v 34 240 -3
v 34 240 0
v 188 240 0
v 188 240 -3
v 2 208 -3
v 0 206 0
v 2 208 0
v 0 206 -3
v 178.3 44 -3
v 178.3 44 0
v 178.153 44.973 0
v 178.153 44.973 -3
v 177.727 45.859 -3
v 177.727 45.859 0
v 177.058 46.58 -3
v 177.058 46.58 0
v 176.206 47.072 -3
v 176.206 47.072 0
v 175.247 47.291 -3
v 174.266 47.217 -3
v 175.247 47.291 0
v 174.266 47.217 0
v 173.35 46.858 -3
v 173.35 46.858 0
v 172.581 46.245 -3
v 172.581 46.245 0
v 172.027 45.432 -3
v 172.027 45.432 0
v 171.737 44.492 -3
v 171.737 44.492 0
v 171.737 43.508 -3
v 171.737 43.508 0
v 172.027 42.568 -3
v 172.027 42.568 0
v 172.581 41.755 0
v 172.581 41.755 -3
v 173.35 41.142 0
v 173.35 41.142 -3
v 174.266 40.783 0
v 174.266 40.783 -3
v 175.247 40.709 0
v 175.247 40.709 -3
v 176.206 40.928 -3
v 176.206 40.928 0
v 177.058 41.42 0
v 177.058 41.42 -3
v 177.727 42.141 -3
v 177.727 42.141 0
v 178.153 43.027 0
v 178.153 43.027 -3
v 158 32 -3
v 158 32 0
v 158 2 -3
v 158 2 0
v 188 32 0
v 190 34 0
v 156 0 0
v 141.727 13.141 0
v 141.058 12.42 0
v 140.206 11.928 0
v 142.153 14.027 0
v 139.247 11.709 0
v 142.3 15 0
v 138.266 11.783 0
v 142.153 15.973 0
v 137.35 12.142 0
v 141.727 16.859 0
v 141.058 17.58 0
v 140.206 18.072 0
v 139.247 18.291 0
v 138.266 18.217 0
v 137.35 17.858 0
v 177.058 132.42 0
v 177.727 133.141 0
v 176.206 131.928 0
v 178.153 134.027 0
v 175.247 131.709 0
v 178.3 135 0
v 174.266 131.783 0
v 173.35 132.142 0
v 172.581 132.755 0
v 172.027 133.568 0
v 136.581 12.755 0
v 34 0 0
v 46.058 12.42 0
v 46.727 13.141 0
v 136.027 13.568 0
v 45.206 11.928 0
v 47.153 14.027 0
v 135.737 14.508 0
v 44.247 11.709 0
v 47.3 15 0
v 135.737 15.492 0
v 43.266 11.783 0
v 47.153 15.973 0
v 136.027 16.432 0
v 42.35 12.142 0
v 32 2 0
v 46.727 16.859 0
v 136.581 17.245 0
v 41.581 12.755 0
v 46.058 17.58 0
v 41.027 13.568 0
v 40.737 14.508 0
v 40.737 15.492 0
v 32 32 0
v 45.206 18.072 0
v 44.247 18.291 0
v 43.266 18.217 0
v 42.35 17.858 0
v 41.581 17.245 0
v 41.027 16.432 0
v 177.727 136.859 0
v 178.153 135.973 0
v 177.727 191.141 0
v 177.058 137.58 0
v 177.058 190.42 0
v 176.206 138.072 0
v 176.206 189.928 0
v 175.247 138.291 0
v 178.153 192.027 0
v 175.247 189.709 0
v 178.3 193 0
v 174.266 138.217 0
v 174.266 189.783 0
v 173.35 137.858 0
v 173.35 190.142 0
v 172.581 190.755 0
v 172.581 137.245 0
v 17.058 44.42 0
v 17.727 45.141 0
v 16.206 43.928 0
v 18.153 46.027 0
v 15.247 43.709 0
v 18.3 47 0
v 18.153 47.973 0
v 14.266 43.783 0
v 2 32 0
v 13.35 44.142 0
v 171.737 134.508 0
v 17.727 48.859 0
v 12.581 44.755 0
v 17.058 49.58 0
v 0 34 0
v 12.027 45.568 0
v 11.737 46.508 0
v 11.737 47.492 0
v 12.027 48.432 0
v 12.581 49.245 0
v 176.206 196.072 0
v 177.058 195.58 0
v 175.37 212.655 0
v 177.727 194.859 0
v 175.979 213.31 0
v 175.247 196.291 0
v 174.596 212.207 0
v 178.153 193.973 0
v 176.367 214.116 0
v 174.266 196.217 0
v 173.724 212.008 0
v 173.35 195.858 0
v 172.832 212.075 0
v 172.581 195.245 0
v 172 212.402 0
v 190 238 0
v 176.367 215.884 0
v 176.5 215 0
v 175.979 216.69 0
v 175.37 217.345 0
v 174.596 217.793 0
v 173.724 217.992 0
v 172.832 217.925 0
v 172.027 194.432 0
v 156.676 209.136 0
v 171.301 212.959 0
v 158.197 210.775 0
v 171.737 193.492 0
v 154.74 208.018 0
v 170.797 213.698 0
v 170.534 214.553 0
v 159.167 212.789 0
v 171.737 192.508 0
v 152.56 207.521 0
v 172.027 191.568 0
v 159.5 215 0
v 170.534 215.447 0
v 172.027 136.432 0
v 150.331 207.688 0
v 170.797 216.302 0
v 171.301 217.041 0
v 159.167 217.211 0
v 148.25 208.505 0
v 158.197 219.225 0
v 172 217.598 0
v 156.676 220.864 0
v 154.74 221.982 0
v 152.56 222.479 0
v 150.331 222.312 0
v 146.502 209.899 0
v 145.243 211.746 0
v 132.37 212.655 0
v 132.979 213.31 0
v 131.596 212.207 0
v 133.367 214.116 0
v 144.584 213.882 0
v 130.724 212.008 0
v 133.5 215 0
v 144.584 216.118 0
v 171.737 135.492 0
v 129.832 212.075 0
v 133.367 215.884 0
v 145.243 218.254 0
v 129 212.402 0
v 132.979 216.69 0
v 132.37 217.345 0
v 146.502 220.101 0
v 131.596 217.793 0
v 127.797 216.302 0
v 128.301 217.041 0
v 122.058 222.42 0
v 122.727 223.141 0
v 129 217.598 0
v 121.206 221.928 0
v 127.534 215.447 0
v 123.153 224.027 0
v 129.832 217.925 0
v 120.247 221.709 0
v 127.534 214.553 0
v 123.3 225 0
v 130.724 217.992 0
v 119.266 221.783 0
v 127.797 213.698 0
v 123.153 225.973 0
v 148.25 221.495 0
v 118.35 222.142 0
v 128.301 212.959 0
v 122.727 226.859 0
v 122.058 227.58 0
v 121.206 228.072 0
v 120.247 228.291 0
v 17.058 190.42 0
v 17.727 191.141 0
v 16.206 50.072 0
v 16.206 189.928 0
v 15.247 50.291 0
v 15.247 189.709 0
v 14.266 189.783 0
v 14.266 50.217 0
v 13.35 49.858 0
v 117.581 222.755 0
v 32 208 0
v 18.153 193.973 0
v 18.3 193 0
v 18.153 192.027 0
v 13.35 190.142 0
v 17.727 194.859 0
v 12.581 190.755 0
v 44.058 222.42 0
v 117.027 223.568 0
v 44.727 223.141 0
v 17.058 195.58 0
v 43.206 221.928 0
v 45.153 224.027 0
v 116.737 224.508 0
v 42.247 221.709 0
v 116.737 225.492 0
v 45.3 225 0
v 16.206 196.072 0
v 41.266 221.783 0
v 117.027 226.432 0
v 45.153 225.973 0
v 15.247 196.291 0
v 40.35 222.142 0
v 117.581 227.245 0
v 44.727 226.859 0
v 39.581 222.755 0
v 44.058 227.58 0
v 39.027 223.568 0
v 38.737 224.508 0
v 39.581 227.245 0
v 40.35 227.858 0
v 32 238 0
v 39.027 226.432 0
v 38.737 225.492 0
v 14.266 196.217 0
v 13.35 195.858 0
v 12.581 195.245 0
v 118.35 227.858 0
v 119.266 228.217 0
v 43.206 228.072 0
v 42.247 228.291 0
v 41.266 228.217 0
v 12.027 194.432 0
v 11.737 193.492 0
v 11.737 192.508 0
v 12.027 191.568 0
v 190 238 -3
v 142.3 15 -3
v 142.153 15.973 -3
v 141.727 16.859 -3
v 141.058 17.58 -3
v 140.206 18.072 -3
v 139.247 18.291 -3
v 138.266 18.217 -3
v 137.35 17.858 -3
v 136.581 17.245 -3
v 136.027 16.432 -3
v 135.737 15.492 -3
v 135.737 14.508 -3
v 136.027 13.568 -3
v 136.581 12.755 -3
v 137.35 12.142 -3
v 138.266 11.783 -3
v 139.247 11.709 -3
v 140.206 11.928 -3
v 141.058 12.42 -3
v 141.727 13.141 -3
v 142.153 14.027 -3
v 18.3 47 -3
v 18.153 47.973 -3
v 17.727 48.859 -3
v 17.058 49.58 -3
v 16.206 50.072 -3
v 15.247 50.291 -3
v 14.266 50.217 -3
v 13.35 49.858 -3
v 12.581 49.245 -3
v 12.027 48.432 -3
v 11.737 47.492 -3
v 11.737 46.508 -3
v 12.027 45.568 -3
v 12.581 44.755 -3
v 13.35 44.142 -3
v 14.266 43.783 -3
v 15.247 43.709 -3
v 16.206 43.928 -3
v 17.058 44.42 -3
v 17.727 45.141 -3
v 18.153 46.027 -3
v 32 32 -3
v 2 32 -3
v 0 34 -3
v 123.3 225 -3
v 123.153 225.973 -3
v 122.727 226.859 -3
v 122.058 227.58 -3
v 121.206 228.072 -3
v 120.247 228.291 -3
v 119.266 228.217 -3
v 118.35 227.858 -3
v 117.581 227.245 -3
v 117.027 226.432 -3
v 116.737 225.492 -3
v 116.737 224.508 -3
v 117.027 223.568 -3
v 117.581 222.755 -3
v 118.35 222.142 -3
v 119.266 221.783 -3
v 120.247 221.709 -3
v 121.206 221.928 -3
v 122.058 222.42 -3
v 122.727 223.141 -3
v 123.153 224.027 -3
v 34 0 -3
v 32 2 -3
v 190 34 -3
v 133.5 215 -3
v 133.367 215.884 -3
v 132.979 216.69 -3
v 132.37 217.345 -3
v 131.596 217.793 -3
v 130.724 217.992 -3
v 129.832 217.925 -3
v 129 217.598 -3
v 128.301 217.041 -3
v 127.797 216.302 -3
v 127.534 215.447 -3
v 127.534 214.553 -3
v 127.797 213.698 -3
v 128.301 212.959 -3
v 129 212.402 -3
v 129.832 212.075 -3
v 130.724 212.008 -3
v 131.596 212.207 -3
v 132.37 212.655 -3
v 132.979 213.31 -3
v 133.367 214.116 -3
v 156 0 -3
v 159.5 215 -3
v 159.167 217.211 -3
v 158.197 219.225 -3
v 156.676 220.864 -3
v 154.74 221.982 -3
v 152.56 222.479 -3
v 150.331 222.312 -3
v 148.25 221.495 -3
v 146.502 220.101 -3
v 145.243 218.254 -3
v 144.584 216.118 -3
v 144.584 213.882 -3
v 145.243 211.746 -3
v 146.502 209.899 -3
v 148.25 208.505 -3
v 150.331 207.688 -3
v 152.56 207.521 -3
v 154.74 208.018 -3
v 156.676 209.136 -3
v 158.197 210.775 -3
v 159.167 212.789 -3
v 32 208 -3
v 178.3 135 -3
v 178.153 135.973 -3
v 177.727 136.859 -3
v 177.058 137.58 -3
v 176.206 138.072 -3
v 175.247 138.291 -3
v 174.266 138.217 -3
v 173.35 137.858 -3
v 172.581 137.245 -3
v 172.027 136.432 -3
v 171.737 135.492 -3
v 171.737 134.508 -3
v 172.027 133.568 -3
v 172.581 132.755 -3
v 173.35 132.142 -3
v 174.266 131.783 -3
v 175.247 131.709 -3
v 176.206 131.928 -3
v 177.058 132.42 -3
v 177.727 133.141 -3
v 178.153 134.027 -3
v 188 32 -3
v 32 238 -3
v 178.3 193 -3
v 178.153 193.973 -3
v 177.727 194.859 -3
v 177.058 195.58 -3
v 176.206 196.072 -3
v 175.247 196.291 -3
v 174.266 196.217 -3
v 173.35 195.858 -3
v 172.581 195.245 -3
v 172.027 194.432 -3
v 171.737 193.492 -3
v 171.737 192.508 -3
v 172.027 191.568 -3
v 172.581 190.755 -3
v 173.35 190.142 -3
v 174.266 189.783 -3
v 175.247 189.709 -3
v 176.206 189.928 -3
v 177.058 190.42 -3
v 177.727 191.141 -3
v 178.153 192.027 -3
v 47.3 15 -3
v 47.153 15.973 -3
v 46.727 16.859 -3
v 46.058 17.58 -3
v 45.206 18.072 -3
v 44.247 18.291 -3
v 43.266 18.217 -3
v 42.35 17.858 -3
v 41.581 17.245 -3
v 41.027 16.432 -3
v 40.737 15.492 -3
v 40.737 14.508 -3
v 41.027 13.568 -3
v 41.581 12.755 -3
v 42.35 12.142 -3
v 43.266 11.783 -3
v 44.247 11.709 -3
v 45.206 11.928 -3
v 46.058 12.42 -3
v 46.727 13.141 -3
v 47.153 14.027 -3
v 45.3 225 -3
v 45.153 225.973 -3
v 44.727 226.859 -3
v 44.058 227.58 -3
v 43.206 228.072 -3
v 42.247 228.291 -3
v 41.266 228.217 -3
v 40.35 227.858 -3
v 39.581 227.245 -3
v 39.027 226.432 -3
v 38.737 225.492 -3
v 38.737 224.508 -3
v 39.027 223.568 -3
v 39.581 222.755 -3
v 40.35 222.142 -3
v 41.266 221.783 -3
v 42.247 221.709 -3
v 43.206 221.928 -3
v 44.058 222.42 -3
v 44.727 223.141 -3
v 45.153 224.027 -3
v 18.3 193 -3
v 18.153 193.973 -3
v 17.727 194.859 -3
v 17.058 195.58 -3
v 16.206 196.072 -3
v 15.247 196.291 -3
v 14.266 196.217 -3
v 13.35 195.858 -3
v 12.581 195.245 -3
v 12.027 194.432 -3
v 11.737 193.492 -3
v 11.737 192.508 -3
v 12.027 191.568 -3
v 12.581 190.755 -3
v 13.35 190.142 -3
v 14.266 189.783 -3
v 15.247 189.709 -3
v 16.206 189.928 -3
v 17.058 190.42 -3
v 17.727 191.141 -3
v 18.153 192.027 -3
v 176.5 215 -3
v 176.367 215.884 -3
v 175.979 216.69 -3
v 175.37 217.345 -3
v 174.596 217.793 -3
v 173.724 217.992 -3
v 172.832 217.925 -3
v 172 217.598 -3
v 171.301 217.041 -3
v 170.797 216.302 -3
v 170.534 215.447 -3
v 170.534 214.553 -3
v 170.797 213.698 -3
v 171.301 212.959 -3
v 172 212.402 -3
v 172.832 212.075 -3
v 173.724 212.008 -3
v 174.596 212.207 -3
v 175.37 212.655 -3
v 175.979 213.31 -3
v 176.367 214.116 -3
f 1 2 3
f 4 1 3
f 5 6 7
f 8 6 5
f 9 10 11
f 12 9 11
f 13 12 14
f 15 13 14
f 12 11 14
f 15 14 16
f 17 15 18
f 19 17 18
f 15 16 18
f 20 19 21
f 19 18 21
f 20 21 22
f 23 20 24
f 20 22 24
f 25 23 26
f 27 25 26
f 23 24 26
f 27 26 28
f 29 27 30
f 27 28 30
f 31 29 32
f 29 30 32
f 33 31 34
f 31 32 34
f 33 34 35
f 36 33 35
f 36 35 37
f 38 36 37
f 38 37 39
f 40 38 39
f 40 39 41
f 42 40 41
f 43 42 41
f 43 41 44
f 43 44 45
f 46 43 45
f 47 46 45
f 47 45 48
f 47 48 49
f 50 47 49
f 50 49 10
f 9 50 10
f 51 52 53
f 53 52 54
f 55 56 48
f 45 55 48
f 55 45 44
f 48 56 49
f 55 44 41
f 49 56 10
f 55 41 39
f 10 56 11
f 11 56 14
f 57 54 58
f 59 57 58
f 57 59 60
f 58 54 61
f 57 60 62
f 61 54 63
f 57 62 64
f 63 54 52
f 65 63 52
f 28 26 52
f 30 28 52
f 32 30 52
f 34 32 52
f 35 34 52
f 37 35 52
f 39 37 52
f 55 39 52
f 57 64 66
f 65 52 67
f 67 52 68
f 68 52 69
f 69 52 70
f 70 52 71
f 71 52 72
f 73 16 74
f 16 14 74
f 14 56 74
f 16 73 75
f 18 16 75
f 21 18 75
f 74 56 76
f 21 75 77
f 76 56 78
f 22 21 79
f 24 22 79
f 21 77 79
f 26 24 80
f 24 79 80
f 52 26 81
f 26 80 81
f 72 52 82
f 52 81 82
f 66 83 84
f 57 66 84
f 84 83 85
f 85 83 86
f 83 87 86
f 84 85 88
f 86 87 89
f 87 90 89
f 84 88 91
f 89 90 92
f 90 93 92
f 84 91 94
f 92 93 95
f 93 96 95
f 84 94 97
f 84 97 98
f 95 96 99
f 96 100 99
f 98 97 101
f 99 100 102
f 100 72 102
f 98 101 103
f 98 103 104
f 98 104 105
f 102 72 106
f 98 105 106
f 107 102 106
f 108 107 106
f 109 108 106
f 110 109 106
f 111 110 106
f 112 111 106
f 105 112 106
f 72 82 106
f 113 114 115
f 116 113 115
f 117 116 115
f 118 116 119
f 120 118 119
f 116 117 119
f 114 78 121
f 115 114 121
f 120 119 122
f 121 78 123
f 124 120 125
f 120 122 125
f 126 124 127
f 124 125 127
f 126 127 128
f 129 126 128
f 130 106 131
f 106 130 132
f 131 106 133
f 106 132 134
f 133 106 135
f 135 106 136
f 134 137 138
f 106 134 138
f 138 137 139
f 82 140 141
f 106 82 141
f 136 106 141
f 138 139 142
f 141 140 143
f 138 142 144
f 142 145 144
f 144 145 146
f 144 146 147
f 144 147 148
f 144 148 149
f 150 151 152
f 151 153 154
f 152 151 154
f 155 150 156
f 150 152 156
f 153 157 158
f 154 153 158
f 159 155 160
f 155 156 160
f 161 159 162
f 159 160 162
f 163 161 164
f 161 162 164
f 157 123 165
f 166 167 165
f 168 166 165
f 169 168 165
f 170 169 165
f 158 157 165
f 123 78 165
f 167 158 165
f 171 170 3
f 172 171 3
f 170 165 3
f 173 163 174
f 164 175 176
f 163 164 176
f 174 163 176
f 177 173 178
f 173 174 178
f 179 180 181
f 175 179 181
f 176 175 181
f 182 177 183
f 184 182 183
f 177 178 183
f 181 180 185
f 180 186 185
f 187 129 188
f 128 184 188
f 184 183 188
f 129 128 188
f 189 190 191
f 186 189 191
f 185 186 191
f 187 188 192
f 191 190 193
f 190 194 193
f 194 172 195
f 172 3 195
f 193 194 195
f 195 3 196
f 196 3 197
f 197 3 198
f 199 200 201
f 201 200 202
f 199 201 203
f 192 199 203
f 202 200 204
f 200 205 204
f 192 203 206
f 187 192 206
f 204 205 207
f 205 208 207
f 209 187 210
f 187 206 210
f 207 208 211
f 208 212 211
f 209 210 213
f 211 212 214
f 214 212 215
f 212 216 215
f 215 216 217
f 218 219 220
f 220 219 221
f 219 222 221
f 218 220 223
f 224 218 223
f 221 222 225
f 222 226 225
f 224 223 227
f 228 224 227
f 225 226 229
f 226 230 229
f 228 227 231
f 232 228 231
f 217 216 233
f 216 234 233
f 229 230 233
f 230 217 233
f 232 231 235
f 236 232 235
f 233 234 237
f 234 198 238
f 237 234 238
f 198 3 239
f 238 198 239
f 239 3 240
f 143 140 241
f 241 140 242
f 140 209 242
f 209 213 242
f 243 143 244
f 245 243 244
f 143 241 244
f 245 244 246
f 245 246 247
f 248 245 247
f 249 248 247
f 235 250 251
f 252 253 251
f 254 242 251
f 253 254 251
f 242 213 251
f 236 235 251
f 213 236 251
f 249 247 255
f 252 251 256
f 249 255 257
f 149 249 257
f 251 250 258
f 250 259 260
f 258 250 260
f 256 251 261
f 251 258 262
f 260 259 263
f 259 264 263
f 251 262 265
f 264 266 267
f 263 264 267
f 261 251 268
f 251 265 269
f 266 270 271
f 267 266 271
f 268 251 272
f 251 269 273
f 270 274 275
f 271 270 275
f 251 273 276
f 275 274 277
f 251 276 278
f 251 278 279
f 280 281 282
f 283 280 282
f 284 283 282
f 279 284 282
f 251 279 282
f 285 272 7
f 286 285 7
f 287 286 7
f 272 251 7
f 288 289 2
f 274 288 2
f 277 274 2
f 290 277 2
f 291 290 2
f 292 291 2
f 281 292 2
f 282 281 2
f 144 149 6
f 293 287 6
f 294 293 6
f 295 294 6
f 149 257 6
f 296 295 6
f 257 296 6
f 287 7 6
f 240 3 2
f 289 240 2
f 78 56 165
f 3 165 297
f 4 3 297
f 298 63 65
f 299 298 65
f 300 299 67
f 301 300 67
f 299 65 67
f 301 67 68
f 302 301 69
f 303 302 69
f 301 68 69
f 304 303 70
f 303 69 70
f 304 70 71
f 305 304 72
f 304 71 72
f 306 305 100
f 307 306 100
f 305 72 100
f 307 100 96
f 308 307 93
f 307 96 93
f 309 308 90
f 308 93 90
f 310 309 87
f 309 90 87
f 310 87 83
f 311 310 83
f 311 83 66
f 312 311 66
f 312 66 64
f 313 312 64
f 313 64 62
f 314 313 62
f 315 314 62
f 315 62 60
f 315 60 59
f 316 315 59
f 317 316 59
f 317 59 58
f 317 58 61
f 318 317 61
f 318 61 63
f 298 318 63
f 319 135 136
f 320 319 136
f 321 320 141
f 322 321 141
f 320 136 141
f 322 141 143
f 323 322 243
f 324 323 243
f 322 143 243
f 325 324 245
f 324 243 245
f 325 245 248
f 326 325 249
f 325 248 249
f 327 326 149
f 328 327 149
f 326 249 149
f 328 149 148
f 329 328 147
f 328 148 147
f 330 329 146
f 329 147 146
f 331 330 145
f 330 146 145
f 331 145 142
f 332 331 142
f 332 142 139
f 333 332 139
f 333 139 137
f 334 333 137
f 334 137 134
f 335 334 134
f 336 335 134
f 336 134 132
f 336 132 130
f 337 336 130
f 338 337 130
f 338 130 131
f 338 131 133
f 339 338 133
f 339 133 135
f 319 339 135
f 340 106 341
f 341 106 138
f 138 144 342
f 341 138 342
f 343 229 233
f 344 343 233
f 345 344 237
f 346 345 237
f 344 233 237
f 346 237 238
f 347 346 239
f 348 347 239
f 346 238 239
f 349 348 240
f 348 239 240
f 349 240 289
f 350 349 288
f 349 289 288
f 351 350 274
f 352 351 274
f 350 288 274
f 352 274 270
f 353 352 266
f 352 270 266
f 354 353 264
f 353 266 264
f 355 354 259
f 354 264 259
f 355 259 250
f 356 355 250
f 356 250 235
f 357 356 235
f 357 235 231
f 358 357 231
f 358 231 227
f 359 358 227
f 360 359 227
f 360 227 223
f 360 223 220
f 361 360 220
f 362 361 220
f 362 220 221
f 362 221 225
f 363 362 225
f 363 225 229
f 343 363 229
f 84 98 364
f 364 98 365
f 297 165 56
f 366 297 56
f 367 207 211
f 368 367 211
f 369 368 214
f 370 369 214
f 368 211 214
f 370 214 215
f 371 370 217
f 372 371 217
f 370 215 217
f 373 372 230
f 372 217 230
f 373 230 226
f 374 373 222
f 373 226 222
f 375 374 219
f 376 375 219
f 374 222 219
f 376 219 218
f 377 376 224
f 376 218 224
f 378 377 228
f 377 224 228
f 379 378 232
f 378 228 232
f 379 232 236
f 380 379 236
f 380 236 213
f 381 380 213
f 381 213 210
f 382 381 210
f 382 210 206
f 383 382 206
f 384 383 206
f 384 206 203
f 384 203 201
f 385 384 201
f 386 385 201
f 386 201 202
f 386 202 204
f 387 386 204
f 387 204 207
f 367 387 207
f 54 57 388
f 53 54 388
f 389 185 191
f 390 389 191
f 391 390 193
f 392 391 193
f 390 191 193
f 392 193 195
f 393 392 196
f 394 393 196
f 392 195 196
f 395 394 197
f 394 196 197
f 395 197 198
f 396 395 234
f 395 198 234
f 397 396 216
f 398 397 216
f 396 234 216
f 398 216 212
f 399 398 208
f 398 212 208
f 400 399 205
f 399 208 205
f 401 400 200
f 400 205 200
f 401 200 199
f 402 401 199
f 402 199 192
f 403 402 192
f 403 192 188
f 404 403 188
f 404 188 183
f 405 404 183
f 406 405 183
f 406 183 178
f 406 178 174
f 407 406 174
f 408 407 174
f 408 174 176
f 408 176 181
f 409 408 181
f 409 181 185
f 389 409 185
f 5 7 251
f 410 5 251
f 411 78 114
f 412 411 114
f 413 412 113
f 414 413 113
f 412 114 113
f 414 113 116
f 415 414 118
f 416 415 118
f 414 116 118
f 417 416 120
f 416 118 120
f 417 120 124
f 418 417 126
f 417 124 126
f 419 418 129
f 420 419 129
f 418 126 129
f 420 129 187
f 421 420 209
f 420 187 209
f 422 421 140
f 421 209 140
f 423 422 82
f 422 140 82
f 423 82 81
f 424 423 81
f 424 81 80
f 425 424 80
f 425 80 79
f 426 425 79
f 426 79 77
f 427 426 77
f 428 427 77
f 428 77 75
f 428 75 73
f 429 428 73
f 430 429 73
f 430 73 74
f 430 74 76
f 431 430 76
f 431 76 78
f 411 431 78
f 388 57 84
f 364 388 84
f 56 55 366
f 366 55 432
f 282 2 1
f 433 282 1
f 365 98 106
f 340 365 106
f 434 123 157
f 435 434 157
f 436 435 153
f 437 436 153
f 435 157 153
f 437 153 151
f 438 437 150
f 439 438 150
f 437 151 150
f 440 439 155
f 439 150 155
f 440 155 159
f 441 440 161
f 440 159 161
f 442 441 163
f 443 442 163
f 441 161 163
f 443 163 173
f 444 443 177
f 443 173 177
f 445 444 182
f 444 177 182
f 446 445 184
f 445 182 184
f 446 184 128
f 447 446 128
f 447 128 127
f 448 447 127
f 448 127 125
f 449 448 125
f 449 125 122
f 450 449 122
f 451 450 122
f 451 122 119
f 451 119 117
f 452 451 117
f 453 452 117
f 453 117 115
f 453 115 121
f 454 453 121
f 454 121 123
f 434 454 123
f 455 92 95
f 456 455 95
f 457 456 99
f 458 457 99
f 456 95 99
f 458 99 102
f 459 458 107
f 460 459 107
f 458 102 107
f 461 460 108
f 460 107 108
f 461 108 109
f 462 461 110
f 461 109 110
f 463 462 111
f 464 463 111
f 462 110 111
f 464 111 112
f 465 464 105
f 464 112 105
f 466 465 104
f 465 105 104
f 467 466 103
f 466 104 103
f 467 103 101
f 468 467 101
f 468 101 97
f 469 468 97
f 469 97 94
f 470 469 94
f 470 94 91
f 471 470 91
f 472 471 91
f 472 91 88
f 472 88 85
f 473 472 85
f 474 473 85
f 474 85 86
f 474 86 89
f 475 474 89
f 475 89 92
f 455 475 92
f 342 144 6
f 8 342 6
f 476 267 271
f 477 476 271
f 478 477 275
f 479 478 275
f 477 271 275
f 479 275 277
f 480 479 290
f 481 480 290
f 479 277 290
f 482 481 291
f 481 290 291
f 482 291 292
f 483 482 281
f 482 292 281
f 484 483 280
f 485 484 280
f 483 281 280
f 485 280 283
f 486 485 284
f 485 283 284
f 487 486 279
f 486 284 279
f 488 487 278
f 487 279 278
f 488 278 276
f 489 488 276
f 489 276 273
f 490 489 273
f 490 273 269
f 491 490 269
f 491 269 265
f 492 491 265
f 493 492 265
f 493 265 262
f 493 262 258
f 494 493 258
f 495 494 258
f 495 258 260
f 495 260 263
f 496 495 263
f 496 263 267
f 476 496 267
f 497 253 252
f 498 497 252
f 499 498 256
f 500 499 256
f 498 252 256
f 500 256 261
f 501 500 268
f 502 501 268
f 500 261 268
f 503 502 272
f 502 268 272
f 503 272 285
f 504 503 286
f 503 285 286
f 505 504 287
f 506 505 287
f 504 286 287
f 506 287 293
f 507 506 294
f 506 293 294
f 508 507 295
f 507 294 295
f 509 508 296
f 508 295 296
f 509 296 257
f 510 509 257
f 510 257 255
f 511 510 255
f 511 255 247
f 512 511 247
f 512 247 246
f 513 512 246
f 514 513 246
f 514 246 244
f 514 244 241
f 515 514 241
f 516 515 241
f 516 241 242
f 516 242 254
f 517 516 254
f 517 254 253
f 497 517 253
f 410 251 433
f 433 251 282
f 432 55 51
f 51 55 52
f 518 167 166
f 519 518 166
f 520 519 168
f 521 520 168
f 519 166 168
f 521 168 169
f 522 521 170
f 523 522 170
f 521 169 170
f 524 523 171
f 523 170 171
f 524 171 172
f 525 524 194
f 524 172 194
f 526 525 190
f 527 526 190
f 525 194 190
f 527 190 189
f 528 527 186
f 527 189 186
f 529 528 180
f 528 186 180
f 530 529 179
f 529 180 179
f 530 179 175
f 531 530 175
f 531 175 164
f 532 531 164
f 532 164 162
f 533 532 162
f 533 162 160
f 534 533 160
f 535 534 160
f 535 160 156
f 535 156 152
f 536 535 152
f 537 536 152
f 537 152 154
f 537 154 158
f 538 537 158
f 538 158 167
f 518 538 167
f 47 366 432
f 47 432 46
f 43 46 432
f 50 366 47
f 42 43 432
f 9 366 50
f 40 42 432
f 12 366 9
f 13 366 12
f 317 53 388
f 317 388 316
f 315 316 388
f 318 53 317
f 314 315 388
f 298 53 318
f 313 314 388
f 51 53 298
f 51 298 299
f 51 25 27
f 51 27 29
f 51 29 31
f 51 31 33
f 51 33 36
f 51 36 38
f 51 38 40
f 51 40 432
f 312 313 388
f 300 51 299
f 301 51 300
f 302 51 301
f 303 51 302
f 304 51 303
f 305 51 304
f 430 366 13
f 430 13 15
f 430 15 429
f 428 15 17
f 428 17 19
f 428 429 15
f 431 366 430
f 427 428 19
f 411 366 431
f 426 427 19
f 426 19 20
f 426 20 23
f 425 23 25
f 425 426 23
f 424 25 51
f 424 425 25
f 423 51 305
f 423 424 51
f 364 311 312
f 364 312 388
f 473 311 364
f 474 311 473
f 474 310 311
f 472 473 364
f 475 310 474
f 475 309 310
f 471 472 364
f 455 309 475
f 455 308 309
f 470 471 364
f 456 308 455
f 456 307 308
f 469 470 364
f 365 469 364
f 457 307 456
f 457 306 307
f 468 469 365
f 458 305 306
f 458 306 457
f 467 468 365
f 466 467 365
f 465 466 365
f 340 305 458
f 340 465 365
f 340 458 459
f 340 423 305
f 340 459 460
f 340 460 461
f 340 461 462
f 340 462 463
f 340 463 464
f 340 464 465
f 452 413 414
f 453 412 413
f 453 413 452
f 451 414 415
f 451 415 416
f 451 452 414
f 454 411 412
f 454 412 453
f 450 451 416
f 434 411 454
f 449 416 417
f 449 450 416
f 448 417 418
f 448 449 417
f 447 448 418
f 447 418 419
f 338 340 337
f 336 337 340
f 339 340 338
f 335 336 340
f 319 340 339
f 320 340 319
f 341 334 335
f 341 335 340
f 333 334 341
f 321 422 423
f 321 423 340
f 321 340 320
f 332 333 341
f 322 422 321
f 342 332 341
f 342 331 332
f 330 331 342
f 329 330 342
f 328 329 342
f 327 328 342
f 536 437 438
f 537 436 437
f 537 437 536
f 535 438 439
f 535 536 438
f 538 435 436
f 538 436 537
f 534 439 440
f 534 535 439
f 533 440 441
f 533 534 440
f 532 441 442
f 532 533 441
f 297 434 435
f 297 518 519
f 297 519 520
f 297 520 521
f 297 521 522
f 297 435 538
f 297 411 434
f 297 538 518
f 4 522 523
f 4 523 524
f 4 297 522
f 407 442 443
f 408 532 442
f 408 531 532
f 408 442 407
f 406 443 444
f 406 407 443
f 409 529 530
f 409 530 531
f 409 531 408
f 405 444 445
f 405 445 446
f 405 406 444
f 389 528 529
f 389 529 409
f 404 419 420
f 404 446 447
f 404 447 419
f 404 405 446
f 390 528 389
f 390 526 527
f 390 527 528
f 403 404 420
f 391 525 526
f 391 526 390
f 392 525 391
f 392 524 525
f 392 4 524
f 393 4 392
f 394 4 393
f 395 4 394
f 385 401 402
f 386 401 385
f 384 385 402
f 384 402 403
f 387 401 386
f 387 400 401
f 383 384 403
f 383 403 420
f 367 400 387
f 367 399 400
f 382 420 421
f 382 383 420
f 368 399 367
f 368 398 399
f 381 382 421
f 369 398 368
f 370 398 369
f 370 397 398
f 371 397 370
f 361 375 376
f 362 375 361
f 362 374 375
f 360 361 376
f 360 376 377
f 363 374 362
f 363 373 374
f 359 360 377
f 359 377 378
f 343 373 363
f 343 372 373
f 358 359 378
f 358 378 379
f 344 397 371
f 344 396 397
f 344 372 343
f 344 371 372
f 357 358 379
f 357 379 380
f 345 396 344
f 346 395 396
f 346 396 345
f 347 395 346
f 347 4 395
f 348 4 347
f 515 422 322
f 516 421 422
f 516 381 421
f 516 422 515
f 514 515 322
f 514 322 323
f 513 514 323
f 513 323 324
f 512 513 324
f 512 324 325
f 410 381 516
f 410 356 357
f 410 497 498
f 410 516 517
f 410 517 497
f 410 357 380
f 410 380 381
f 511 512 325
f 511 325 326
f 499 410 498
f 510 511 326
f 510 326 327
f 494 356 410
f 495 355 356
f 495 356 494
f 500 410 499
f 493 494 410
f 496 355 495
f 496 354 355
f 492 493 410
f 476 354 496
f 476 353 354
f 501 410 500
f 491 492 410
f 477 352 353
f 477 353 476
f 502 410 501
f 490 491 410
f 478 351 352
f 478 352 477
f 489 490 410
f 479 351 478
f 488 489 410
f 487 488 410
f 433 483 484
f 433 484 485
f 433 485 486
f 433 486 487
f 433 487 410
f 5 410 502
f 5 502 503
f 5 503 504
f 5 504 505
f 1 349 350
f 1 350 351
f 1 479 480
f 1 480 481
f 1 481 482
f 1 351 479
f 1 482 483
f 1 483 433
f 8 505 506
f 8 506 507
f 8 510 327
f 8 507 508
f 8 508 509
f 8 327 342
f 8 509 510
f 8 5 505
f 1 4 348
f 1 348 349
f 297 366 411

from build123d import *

# Parameters (mm, degrees)
BASE_FLANGE1_DEPTH = 3
CHAMFER1_SIZE      = 2
SKETCH3_R          = 3
CUT_EXTRUDE1_DEPTH = 10
SKETCH4_R          = 3.3
SKETCH4_R_2        = 7.5
CUT_EXTRUDE2_DEPTH = 10


# Sheet-metal steps are written as plain solids
with BuildPart() as part:
    # Sketch1 → Base-Flange1 (new body)
    with BuildSketch(Plane.XY):
        Polygon((0, 208), (32, 208), (32, 240), (190, 240), (190, 32), (158, 32), (158, 0), (32, 0), (32, 32), (0, 32), align=None)
    extrude(amount=-BASE_FLANGE1_DEPTH)

    # Chamfer1
    chamfer1_edges = [part.edges().sort_by_distance(p)[0] for p in [
        (190, 32, -1.5),
        (158, 0, -1.5),
        (32, 0, -1.5),
        (0, 32, -1.5),
        (0, 208, -1.5),
        (32, 240, -1.5),
        (190, 240, -1.5),
    ]]
    chamfer(chamfer1_edges, length=CHAMFER1_SIZE)

    # Sketch3 → Cut-Extrude1 (cut)
    with BuildSketch(Plane.XY):
        with Locations((130.5, 215)):
            Circle(SKETCH3_R)
        with Locations((173.5, 215)):
            Circle(SKETCH3_R)
    extrude(amount=-CUT_EXTRUDE1_DEPTH, mode=Mode.SUBTRACT)

    # Sketch4 → Cut-Extrude2 (cut)
    with BuildSketch(Plane.XY):
        with Locations((42, 225)):
            Circle(SKETCH4_R)
        with Locations((120, 225)):
            Circle(SKETCH4_R)
        with Locations((175, 193)):
            Circle(SKETCH4_R)
        with Locations((175, 135)):
            Circle(SKETCH4_R)
        with Locations((175, 44)):
            Circle(SKETCH4_R)
        with Locations((139, 15)):
            Circle(SKETCH4_R)
        with Locations((44, 15)):
            Circle(SKETCH4_R)
        with Locations((15, 193)):
            Circle(SKETCH4_R)
        with Locations((15, 47)):
            Circle(SKETCH4_R)
        with Locations((152, 215)):
            Circle(SKETCH4_R_2)
    extrude(amount=-CUT_EXTRUDE2_DEPTH, mode=Mode.SUBTRACT)


solid = part.part
